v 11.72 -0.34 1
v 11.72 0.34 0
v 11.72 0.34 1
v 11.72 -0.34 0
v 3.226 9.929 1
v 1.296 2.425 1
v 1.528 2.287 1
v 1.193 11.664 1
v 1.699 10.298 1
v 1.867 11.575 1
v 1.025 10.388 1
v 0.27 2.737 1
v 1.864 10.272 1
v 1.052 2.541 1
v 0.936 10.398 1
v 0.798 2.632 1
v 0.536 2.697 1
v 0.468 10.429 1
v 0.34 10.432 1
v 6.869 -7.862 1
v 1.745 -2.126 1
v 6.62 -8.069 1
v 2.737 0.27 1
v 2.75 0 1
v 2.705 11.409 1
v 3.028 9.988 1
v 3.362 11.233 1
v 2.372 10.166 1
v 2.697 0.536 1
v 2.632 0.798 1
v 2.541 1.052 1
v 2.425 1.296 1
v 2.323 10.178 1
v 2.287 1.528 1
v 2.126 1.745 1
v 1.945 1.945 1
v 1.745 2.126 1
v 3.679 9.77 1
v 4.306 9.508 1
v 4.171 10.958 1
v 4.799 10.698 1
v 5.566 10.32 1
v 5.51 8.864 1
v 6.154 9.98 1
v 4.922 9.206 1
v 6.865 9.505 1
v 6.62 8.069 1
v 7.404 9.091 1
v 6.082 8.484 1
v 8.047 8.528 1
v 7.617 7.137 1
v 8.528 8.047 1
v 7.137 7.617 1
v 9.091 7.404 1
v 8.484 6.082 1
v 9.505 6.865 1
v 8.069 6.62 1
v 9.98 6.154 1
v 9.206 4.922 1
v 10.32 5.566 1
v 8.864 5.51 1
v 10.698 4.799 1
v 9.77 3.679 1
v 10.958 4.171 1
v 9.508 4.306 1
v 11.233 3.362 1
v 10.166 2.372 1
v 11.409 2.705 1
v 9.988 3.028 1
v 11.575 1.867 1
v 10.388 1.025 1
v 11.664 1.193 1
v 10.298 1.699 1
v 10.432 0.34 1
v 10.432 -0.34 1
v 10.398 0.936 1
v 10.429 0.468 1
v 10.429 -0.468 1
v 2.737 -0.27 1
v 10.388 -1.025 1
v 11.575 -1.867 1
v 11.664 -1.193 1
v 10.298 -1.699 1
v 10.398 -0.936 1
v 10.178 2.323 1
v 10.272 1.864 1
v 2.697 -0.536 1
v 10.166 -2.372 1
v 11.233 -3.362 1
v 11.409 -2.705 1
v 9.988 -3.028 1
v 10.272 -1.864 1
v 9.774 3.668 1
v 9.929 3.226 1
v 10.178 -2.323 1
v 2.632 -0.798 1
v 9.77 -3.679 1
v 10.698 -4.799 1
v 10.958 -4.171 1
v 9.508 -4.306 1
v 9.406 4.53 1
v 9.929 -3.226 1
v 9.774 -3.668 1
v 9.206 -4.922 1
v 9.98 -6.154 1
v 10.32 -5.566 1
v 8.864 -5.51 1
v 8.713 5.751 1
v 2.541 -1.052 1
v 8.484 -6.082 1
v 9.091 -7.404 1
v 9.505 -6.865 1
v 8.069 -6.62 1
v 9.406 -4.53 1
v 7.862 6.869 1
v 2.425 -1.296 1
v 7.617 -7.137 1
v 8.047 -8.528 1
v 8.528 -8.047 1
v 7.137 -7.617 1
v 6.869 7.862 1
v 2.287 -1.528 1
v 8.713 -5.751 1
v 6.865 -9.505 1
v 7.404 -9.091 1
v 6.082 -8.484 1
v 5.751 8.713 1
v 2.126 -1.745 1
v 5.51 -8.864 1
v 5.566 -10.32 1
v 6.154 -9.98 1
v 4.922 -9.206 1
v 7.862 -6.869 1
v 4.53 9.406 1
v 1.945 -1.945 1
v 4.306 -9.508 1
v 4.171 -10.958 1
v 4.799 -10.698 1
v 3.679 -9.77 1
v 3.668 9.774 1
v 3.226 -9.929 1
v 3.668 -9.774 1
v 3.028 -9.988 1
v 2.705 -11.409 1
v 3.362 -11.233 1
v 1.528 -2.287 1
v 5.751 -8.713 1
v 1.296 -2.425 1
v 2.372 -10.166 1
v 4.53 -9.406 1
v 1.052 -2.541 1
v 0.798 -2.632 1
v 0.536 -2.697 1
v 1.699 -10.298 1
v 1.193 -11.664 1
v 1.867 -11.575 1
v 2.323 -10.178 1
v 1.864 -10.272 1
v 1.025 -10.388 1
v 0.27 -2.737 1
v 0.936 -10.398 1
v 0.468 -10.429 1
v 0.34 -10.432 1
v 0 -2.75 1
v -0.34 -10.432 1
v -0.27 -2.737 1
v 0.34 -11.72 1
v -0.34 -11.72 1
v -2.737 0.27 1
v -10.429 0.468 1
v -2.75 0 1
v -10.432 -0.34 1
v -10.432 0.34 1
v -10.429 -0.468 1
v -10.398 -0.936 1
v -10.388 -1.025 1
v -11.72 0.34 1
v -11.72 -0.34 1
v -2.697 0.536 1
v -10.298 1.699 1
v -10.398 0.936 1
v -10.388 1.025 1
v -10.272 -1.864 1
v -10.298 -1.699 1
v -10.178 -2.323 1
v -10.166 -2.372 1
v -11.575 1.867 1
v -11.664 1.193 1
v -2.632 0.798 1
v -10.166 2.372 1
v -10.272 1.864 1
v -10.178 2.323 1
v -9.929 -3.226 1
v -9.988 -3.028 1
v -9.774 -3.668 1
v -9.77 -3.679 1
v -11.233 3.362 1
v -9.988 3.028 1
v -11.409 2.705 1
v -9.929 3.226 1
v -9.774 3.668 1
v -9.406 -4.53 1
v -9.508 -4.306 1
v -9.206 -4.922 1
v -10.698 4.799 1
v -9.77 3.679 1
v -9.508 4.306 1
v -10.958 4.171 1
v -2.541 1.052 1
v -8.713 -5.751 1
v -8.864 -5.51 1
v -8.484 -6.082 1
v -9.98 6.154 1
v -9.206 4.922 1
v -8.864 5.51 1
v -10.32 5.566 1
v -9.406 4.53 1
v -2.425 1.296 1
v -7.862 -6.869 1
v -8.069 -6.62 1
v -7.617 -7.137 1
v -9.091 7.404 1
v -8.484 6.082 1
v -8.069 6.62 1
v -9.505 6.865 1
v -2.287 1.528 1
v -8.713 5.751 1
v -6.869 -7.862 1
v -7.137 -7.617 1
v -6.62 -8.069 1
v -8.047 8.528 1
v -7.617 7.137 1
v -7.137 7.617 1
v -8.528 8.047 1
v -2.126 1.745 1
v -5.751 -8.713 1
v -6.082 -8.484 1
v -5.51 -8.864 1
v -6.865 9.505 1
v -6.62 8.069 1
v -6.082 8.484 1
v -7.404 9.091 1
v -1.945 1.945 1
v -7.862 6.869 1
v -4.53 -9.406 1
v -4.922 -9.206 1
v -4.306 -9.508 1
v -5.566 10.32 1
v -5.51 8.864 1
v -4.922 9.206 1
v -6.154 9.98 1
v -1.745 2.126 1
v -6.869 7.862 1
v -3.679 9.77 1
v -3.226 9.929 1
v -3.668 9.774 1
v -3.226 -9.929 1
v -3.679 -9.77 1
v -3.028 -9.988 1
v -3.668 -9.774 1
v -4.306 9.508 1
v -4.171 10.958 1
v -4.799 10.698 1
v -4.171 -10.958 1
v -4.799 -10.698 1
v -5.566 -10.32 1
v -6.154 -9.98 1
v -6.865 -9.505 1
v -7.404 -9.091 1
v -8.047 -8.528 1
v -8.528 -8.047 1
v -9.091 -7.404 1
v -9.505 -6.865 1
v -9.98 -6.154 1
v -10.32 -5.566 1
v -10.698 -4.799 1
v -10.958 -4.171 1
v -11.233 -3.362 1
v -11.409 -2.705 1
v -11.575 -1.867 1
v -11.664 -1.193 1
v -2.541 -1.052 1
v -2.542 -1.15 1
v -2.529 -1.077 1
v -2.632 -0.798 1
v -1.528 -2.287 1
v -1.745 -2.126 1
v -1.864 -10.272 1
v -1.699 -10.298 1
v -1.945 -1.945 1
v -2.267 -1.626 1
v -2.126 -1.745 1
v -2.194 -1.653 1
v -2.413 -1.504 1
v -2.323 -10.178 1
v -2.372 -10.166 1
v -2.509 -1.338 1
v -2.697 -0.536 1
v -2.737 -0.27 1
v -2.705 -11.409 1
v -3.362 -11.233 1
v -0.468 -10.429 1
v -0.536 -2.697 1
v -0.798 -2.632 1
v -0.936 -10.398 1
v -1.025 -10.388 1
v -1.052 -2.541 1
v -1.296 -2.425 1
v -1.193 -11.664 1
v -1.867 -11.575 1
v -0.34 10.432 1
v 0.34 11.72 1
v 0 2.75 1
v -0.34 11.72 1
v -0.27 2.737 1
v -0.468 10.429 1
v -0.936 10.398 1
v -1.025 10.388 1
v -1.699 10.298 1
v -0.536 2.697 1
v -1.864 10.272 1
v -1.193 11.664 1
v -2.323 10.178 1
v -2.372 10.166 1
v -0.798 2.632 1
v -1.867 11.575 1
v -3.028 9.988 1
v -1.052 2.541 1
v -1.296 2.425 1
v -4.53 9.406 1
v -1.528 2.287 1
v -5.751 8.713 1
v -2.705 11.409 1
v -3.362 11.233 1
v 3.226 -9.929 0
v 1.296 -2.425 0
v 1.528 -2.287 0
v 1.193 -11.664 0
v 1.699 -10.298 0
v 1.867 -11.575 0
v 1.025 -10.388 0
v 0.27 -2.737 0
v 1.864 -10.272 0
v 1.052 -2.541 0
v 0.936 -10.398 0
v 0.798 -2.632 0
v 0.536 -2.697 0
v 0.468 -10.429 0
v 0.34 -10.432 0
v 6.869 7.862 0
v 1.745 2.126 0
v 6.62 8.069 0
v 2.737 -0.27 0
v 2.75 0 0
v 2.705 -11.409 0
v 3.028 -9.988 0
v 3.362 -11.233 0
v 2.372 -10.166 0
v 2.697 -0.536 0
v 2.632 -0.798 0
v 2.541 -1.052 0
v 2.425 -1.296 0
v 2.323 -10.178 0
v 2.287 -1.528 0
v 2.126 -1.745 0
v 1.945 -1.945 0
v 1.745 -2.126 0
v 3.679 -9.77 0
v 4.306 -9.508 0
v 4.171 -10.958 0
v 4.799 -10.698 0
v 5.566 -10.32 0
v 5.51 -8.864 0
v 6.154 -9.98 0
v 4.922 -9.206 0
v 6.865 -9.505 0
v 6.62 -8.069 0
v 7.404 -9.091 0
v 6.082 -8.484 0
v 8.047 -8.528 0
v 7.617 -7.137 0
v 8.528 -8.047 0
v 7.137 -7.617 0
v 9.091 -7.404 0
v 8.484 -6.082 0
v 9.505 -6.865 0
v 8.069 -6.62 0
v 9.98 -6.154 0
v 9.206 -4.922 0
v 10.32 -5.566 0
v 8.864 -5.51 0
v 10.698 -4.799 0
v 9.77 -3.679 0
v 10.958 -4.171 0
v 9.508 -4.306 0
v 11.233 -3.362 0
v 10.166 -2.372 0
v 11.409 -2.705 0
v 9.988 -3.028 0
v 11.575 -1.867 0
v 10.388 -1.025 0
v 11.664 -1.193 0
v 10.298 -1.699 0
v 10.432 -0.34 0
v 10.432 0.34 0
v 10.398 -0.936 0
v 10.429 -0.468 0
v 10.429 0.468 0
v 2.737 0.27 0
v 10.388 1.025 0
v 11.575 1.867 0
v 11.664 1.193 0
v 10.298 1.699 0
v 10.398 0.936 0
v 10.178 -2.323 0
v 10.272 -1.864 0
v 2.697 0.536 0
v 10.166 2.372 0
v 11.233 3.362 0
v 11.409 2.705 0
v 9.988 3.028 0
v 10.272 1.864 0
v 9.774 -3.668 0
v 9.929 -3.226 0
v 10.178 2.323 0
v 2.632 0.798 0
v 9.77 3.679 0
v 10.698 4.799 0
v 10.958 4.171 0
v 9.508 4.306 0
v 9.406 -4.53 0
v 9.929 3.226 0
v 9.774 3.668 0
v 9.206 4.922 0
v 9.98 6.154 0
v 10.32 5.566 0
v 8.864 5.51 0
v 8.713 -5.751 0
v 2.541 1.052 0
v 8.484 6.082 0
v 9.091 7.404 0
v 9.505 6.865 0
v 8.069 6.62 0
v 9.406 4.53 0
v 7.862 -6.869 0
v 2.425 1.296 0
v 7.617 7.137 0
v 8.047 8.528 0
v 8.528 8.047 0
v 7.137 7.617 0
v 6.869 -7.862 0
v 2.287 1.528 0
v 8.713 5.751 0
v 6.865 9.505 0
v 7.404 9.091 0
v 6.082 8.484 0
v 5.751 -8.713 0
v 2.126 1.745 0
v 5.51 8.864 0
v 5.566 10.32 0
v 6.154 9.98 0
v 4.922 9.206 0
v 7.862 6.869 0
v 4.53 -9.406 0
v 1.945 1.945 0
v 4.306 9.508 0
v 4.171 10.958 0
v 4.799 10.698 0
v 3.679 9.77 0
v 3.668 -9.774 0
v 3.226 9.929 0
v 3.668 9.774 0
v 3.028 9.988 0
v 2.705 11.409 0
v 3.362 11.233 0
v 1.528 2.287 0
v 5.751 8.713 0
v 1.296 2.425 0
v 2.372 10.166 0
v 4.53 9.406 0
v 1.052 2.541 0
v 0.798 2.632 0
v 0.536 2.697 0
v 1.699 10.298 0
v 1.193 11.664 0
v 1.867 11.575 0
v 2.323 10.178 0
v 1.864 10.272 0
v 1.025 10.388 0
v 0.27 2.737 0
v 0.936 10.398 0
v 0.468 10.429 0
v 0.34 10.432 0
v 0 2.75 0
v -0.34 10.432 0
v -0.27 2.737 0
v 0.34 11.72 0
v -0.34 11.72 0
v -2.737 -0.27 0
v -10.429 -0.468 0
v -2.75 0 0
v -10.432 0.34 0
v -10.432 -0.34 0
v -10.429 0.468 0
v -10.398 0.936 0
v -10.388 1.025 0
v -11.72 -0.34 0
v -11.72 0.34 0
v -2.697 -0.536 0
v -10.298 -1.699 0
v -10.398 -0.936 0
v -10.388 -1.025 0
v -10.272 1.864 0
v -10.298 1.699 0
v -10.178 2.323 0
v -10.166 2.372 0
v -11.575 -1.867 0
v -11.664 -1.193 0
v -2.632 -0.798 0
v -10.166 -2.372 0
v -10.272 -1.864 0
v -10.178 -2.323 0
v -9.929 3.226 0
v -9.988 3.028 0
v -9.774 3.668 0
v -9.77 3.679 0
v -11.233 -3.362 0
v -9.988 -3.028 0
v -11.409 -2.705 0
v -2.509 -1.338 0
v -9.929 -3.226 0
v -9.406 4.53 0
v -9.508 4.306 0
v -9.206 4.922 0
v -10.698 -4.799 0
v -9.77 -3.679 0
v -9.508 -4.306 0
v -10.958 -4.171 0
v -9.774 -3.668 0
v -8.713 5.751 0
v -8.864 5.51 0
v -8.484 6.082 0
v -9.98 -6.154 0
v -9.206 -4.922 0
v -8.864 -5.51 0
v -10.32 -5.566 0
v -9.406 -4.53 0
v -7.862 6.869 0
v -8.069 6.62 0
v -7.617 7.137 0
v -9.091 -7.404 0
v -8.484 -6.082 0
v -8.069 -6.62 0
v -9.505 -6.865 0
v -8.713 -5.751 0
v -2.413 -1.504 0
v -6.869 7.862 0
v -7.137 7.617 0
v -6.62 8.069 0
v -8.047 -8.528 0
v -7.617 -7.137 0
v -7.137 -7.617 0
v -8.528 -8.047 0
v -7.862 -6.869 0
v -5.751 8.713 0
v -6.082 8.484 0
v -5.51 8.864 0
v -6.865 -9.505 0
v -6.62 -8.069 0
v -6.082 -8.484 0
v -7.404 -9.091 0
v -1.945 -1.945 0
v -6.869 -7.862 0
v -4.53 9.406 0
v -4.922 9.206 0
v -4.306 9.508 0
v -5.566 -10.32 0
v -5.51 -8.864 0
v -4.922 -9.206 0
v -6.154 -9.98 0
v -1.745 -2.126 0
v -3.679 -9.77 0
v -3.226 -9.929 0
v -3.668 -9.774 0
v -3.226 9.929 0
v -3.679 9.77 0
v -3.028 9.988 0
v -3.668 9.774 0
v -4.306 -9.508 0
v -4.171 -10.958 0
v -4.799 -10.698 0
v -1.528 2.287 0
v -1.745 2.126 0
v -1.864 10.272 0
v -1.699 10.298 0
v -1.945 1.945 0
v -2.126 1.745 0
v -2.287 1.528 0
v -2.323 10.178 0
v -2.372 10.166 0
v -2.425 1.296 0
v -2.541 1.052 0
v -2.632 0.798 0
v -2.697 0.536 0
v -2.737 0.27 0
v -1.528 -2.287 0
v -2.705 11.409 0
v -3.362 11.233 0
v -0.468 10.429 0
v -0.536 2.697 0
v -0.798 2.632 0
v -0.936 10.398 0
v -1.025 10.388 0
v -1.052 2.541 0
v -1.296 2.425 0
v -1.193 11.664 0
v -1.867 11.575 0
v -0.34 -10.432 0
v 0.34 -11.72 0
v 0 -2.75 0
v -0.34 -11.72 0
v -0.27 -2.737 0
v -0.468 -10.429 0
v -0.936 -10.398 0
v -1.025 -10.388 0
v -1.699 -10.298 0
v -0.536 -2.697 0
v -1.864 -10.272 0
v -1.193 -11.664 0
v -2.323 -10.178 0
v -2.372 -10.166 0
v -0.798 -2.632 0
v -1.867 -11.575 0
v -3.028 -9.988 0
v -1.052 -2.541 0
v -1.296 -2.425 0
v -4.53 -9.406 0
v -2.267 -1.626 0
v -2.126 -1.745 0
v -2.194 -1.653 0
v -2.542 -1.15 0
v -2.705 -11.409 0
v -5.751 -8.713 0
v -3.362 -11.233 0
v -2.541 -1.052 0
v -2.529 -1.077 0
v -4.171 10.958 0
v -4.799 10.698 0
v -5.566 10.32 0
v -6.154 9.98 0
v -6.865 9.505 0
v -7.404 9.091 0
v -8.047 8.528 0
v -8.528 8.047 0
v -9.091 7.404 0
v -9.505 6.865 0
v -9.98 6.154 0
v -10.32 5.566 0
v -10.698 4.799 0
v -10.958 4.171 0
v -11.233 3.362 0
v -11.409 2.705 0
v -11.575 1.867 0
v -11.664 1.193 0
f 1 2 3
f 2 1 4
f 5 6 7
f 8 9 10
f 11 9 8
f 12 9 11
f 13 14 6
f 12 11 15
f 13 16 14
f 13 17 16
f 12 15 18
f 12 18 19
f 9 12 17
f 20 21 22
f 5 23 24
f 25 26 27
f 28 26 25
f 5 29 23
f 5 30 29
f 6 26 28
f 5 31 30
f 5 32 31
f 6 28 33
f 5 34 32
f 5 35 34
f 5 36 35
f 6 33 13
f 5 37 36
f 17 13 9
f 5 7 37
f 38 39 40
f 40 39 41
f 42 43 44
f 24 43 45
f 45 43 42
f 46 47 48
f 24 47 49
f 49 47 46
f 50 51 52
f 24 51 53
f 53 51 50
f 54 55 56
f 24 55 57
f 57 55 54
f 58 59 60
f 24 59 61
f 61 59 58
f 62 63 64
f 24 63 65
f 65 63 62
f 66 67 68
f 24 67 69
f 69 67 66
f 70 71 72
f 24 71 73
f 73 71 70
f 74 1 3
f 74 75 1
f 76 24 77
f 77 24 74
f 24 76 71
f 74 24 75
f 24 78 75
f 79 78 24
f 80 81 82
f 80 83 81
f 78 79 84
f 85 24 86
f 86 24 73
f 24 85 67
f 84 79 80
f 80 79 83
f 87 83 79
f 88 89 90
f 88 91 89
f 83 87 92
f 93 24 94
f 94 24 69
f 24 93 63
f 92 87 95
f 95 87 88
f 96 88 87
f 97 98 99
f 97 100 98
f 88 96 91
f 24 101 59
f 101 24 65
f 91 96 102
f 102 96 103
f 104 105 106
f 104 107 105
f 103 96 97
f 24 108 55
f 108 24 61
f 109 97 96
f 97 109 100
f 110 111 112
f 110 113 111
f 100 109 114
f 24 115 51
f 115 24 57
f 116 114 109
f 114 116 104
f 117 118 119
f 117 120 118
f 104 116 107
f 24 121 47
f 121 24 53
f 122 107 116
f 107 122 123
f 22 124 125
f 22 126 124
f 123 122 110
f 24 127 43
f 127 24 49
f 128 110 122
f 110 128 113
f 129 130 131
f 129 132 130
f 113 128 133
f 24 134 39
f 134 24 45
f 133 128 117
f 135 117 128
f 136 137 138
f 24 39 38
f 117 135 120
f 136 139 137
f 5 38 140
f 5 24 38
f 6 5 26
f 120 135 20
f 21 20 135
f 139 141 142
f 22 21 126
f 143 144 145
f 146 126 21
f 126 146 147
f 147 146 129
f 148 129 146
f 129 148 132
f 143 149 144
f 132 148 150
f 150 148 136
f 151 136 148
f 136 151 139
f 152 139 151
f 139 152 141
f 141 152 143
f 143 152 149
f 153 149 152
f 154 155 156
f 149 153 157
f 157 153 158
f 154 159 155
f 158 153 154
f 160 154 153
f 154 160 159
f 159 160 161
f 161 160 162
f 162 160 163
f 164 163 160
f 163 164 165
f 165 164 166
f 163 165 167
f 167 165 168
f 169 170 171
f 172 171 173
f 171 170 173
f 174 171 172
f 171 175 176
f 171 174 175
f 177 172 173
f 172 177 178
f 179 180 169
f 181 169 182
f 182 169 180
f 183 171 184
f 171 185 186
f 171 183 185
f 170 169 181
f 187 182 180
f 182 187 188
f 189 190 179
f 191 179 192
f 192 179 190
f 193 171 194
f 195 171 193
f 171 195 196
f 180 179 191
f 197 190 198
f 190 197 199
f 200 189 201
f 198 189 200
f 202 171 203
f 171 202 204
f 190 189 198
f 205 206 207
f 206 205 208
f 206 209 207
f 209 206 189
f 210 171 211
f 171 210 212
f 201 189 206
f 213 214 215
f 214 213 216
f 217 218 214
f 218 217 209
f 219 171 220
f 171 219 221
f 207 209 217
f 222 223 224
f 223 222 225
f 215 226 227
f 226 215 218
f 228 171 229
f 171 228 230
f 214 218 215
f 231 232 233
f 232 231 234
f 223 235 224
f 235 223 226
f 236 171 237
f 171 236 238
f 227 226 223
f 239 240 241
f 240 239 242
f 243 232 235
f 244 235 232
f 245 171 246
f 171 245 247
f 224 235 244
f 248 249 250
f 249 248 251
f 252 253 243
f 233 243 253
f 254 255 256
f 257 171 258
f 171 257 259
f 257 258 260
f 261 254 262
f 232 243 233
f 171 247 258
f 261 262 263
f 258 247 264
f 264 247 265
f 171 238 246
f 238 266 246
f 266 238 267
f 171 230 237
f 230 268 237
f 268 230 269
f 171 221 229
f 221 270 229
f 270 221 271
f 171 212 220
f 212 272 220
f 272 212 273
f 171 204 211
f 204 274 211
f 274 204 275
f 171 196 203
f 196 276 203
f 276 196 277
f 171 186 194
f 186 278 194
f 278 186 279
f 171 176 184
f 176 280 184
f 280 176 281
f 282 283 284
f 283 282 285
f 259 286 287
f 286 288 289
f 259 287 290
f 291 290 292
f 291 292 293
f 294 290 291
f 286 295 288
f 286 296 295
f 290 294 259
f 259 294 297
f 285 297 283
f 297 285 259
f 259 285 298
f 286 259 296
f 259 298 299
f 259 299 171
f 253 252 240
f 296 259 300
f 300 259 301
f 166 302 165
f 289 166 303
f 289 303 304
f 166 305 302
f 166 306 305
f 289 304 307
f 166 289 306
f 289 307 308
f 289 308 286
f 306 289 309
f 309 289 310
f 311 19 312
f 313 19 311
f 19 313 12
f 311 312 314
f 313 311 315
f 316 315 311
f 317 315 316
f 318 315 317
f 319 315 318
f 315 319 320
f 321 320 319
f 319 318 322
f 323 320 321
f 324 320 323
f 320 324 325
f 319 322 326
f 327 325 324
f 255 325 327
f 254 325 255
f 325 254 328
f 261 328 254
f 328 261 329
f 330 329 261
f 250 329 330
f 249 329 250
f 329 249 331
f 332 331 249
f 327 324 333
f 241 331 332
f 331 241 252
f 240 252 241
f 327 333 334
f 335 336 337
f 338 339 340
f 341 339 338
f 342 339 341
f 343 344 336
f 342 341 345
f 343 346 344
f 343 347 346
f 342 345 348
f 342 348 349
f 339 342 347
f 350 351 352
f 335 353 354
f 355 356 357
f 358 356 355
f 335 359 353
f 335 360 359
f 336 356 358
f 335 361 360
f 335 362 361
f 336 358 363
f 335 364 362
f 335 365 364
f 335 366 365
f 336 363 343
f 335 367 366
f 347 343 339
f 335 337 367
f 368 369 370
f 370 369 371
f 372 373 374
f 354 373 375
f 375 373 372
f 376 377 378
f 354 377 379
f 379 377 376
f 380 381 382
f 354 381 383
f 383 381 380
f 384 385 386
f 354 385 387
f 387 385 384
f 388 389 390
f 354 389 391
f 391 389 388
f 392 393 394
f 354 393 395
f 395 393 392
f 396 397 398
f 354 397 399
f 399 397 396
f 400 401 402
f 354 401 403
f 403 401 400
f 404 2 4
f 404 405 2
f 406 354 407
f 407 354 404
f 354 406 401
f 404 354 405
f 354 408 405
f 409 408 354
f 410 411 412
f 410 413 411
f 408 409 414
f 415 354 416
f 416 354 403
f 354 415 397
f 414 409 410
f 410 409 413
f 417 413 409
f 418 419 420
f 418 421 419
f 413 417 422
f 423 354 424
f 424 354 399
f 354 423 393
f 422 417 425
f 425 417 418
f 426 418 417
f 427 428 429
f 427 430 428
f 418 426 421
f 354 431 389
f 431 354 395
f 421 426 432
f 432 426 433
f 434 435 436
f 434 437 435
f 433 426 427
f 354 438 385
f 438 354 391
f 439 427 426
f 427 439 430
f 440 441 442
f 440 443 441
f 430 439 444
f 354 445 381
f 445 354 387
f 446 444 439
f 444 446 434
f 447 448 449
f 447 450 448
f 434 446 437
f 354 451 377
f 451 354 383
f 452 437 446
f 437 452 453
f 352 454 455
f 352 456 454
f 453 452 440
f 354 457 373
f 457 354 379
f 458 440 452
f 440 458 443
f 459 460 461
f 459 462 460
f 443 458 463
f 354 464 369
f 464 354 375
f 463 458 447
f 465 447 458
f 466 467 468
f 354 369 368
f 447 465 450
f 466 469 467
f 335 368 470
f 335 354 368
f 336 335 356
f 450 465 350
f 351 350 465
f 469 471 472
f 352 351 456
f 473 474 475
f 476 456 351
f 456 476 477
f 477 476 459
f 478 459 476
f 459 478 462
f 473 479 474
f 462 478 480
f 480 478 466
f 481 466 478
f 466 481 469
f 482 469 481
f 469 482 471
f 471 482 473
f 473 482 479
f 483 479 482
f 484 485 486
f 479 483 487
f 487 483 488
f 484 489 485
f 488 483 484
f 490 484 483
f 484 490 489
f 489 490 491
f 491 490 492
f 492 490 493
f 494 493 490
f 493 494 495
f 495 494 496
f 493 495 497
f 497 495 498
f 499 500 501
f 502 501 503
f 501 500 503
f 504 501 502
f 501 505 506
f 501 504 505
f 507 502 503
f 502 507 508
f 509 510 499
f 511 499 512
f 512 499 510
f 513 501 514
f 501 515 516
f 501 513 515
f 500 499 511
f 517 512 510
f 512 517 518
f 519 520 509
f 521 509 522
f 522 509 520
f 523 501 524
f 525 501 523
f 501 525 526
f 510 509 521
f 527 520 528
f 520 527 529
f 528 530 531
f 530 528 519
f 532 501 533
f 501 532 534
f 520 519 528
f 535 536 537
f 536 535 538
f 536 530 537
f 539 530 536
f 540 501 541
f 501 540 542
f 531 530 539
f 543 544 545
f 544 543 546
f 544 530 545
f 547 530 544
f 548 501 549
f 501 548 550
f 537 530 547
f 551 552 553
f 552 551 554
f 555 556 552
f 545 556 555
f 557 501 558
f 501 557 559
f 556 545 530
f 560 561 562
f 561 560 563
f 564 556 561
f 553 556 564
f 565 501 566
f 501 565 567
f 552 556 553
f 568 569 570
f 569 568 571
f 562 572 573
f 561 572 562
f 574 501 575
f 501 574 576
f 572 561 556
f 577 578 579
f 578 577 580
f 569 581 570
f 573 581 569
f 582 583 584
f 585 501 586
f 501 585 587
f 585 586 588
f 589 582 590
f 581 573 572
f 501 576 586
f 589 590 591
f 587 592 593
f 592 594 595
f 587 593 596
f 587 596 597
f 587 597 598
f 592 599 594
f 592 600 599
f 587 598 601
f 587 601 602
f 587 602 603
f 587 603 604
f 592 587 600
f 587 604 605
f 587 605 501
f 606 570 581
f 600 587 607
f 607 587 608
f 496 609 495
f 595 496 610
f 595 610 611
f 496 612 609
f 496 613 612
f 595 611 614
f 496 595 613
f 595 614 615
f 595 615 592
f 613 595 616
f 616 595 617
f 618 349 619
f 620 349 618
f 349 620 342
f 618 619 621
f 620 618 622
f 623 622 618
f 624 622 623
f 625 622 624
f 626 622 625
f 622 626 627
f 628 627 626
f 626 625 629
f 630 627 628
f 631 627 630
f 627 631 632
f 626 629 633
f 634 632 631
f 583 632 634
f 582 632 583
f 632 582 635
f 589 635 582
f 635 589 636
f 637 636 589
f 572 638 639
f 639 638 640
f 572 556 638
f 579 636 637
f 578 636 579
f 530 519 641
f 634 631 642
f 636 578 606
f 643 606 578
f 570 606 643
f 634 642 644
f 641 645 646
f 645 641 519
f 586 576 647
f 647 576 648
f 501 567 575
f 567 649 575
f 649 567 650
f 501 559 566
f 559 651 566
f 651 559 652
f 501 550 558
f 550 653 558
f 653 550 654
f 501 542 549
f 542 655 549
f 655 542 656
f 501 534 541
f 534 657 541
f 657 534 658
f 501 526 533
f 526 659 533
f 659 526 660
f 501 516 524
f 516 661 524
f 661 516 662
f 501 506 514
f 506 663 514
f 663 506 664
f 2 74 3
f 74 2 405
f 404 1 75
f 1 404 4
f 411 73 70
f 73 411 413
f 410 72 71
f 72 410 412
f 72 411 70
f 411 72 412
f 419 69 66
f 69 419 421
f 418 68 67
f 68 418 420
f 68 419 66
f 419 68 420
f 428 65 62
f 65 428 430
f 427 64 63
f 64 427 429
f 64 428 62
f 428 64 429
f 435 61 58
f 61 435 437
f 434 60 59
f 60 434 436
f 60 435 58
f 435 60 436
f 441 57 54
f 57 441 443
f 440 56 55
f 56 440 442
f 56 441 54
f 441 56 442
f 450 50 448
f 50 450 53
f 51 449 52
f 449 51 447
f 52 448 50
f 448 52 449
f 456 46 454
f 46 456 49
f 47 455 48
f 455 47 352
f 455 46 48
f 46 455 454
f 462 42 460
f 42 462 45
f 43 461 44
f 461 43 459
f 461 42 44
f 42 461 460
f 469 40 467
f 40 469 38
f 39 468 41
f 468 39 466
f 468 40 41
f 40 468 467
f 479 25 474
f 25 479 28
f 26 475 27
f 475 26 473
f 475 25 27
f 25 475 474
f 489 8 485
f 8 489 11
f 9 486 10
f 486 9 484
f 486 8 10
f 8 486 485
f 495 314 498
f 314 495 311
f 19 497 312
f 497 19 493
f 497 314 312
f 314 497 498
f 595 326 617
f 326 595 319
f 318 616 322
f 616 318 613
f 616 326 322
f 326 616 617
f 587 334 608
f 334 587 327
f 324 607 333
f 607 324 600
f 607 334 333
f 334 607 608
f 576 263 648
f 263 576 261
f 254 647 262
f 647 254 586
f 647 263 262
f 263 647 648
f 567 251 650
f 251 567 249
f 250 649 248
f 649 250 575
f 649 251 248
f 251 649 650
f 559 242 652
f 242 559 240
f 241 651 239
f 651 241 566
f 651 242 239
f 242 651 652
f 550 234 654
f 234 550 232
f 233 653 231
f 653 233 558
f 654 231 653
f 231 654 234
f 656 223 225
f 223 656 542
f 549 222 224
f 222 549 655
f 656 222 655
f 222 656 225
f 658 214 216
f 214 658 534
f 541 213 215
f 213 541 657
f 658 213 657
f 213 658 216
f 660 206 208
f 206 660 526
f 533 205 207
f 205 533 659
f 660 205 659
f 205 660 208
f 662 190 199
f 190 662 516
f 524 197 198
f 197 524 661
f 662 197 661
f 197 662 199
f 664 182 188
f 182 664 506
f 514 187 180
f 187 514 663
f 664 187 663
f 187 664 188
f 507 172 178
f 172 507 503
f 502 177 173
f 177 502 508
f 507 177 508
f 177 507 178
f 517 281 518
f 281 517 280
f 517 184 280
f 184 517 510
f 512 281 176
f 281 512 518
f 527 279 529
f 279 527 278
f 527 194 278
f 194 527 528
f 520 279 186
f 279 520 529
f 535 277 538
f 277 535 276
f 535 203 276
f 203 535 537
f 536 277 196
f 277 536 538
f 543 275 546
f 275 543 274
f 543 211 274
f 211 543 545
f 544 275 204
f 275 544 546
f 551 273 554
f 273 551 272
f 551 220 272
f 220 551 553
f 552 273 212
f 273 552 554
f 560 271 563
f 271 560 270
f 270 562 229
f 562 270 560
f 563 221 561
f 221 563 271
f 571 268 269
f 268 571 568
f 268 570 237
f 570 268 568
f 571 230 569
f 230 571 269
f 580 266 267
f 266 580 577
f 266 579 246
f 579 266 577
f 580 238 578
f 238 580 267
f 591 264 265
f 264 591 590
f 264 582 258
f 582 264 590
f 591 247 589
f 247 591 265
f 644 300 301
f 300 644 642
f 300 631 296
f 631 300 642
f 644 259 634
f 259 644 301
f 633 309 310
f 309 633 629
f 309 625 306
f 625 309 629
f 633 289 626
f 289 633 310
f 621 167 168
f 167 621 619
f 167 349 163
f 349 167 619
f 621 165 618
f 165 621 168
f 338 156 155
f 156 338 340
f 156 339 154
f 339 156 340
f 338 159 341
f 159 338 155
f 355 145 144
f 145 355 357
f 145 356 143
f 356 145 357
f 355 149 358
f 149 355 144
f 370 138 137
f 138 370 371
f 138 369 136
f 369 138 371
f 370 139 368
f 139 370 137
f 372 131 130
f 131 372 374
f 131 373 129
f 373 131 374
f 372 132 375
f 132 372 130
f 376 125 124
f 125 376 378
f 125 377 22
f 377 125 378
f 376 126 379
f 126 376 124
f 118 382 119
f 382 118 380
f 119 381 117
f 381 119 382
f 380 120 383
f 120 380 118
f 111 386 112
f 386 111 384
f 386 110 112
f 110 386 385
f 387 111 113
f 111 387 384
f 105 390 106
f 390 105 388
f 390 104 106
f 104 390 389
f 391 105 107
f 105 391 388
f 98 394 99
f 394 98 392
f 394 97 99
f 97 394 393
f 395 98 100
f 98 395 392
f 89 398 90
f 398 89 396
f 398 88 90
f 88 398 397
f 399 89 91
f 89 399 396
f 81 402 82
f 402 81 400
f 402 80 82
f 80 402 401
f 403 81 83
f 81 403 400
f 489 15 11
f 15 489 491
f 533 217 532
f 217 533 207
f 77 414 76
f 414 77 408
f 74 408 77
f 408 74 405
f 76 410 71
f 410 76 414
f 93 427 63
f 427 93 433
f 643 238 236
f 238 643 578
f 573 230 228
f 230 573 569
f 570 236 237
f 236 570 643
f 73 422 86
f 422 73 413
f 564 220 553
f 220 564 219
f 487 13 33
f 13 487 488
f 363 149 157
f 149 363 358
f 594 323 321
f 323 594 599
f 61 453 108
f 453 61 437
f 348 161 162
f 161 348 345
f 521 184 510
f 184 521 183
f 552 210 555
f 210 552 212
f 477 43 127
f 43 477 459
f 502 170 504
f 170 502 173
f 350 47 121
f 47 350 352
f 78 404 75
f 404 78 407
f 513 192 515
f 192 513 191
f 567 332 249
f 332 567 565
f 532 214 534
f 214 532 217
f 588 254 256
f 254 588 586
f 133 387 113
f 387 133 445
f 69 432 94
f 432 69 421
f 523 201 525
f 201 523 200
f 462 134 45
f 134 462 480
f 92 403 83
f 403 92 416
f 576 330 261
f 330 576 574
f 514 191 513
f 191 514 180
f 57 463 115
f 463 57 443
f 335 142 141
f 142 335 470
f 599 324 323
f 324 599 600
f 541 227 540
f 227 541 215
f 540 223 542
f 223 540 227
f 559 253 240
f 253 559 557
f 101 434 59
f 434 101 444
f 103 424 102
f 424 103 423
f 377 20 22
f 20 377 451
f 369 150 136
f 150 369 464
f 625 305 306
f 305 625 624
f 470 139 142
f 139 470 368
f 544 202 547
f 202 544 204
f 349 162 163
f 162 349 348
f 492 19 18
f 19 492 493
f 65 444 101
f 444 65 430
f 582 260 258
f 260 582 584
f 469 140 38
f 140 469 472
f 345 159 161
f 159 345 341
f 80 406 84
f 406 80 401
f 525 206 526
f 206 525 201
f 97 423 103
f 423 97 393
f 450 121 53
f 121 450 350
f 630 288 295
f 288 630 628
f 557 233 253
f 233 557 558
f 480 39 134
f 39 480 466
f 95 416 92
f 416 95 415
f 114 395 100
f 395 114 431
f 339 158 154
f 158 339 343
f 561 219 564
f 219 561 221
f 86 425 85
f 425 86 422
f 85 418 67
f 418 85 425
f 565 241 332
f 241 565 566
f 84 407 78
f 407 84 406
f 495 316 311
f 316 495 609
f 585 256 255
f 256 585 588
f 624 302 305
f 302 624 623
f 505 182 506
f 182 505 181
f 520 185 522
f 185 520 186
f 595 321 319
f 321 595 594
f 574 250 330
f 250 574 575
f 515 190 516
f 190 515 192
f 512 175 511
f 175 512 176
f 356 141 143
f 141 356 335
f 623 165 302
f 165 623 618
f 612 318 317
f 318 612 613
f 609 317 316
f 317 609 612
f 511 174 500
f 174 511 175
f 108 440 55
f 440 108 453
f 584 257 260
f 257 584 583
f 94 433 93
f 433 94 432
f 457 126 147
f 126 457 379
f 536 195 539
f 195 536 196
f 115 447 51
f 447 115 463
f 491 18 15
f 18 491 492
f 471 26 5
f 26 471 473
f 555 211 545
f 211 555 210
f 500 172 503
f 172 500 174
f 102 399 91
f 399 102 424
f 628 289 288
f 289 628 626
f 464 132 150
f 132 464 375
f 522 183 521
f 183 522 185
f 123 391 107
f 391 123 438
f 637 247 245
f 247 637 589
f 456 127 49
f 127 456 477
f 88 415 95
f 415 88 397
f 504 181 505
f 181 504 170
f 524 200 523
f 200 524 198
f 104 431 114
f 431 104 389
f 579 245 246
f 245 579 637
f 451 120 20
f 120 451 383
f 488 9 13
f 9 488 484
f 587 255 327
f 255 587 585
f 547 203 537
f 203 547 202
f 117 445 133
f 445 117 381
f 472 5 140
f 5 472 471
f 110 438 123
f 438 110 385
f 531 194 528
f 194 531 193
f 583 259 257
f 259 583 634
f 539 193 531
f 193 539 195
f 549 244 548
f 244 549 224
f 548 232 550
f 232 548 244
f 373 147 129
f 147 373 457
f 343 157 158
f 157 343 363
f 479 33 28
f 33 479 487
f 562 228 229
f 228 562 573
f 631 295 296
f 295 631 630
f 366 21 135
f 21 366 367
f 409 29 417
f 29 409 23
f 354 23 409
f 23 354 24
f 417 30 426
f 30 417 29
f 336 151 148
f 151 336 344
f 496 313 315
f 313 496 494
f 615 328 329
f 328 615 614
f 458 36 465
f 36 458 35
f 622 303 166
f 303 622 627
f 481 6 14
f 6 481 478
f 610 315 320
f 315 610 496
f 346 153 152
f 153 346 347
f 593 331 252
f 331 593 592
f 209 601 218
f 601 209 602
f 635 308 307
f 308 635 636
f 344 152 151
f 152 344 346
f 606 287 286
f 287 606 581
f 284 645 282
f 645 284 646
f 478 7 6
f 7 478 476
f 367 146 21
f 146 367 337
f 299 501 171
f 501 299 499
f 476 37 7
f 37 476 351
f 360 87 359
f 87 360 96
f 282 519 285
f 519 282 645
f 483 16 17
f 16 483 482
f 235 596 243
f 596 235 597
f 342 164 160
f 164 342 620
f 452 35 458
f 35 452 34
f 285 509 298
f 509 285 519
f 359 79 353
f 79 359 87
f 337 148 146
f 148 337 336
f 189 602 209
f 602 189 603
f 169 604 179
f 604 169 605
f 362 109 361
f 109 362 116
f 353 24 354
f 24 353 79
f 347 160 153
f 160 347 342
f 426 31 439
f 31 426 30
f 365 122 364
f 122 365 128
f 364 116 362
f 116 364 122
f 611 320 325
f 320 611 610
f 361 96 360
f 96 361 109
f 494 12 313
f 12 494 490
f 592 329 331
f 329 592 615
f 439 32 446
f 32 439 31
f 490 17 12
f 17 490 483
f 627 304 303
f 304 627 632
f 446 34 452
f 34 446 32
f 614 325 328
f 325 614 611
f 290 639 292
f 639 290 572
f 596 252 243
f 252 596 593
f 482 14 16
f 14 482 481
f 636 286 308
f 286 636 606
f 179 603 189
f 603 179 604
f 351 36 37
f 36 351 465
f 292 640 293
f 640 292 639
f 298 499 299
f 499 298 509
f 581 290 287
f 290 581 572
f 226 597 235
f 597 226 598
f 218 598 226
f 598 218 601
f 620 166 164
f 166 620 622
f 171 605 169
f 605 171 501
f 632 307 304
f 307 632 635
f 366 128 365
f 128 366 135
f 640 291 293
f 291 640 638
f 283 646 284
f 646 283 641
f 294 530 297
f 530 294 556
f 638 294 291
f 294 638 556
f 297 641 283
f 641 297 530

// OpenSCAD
// part_id: mar2
// name: Mars transfer gear
// source_drawing_ids: DRW-013
// units: mm
// revision: 0.1
// SPDX-License-Identifier: MIT

module mar2_tooth_ring(root_d = 20.88, tip_d = 23.40, tooth_count = 48, thickness = 1.0, tooth_w = 0.68) {
    union() {
        cylinder(d = root_d, h = thickness, center = false, $fn = 140);
        for (a = [0 : 360 / tooth_count : 360 - 360 / tooth_count]) {
            rotate([0, 0, a])
                translate([root_d / 2 - 0.02, -tooth_w / 2, 0])
                    cube([(tip_d - root_d) / 2 + 0.04, tooth_w, thickness], center = false);
        }
    }
}

module part_mar2(
    root_d = 20.88,
    tip_d = 23.40,
    tooth_count = 48,
    thickness = 1.0,
    bore_d = 5.5,
    key_d = 1.1,
    key_r = 2.3,
    key_a = 210
) {
    difference() {
        mar2_tooth_ring(root_d = root_d, tip_d = tip_d, tooth_count = tooth_count, thickness = thickness);
        translate([0, 0, -0.05]) cylinder(d = bore_d, h = thickness + 0.1, $fn = 64);
        translate([key_r * cos(key_a), key_r * sin(key_a), -0.05]) cylinder(d = key_d, h = thickness + 0.1, $fn = 18);
    }
}

// ---- "main guard" ----
if (is_undef(__LIB_MODE__)) {
    part_mar2();
}
